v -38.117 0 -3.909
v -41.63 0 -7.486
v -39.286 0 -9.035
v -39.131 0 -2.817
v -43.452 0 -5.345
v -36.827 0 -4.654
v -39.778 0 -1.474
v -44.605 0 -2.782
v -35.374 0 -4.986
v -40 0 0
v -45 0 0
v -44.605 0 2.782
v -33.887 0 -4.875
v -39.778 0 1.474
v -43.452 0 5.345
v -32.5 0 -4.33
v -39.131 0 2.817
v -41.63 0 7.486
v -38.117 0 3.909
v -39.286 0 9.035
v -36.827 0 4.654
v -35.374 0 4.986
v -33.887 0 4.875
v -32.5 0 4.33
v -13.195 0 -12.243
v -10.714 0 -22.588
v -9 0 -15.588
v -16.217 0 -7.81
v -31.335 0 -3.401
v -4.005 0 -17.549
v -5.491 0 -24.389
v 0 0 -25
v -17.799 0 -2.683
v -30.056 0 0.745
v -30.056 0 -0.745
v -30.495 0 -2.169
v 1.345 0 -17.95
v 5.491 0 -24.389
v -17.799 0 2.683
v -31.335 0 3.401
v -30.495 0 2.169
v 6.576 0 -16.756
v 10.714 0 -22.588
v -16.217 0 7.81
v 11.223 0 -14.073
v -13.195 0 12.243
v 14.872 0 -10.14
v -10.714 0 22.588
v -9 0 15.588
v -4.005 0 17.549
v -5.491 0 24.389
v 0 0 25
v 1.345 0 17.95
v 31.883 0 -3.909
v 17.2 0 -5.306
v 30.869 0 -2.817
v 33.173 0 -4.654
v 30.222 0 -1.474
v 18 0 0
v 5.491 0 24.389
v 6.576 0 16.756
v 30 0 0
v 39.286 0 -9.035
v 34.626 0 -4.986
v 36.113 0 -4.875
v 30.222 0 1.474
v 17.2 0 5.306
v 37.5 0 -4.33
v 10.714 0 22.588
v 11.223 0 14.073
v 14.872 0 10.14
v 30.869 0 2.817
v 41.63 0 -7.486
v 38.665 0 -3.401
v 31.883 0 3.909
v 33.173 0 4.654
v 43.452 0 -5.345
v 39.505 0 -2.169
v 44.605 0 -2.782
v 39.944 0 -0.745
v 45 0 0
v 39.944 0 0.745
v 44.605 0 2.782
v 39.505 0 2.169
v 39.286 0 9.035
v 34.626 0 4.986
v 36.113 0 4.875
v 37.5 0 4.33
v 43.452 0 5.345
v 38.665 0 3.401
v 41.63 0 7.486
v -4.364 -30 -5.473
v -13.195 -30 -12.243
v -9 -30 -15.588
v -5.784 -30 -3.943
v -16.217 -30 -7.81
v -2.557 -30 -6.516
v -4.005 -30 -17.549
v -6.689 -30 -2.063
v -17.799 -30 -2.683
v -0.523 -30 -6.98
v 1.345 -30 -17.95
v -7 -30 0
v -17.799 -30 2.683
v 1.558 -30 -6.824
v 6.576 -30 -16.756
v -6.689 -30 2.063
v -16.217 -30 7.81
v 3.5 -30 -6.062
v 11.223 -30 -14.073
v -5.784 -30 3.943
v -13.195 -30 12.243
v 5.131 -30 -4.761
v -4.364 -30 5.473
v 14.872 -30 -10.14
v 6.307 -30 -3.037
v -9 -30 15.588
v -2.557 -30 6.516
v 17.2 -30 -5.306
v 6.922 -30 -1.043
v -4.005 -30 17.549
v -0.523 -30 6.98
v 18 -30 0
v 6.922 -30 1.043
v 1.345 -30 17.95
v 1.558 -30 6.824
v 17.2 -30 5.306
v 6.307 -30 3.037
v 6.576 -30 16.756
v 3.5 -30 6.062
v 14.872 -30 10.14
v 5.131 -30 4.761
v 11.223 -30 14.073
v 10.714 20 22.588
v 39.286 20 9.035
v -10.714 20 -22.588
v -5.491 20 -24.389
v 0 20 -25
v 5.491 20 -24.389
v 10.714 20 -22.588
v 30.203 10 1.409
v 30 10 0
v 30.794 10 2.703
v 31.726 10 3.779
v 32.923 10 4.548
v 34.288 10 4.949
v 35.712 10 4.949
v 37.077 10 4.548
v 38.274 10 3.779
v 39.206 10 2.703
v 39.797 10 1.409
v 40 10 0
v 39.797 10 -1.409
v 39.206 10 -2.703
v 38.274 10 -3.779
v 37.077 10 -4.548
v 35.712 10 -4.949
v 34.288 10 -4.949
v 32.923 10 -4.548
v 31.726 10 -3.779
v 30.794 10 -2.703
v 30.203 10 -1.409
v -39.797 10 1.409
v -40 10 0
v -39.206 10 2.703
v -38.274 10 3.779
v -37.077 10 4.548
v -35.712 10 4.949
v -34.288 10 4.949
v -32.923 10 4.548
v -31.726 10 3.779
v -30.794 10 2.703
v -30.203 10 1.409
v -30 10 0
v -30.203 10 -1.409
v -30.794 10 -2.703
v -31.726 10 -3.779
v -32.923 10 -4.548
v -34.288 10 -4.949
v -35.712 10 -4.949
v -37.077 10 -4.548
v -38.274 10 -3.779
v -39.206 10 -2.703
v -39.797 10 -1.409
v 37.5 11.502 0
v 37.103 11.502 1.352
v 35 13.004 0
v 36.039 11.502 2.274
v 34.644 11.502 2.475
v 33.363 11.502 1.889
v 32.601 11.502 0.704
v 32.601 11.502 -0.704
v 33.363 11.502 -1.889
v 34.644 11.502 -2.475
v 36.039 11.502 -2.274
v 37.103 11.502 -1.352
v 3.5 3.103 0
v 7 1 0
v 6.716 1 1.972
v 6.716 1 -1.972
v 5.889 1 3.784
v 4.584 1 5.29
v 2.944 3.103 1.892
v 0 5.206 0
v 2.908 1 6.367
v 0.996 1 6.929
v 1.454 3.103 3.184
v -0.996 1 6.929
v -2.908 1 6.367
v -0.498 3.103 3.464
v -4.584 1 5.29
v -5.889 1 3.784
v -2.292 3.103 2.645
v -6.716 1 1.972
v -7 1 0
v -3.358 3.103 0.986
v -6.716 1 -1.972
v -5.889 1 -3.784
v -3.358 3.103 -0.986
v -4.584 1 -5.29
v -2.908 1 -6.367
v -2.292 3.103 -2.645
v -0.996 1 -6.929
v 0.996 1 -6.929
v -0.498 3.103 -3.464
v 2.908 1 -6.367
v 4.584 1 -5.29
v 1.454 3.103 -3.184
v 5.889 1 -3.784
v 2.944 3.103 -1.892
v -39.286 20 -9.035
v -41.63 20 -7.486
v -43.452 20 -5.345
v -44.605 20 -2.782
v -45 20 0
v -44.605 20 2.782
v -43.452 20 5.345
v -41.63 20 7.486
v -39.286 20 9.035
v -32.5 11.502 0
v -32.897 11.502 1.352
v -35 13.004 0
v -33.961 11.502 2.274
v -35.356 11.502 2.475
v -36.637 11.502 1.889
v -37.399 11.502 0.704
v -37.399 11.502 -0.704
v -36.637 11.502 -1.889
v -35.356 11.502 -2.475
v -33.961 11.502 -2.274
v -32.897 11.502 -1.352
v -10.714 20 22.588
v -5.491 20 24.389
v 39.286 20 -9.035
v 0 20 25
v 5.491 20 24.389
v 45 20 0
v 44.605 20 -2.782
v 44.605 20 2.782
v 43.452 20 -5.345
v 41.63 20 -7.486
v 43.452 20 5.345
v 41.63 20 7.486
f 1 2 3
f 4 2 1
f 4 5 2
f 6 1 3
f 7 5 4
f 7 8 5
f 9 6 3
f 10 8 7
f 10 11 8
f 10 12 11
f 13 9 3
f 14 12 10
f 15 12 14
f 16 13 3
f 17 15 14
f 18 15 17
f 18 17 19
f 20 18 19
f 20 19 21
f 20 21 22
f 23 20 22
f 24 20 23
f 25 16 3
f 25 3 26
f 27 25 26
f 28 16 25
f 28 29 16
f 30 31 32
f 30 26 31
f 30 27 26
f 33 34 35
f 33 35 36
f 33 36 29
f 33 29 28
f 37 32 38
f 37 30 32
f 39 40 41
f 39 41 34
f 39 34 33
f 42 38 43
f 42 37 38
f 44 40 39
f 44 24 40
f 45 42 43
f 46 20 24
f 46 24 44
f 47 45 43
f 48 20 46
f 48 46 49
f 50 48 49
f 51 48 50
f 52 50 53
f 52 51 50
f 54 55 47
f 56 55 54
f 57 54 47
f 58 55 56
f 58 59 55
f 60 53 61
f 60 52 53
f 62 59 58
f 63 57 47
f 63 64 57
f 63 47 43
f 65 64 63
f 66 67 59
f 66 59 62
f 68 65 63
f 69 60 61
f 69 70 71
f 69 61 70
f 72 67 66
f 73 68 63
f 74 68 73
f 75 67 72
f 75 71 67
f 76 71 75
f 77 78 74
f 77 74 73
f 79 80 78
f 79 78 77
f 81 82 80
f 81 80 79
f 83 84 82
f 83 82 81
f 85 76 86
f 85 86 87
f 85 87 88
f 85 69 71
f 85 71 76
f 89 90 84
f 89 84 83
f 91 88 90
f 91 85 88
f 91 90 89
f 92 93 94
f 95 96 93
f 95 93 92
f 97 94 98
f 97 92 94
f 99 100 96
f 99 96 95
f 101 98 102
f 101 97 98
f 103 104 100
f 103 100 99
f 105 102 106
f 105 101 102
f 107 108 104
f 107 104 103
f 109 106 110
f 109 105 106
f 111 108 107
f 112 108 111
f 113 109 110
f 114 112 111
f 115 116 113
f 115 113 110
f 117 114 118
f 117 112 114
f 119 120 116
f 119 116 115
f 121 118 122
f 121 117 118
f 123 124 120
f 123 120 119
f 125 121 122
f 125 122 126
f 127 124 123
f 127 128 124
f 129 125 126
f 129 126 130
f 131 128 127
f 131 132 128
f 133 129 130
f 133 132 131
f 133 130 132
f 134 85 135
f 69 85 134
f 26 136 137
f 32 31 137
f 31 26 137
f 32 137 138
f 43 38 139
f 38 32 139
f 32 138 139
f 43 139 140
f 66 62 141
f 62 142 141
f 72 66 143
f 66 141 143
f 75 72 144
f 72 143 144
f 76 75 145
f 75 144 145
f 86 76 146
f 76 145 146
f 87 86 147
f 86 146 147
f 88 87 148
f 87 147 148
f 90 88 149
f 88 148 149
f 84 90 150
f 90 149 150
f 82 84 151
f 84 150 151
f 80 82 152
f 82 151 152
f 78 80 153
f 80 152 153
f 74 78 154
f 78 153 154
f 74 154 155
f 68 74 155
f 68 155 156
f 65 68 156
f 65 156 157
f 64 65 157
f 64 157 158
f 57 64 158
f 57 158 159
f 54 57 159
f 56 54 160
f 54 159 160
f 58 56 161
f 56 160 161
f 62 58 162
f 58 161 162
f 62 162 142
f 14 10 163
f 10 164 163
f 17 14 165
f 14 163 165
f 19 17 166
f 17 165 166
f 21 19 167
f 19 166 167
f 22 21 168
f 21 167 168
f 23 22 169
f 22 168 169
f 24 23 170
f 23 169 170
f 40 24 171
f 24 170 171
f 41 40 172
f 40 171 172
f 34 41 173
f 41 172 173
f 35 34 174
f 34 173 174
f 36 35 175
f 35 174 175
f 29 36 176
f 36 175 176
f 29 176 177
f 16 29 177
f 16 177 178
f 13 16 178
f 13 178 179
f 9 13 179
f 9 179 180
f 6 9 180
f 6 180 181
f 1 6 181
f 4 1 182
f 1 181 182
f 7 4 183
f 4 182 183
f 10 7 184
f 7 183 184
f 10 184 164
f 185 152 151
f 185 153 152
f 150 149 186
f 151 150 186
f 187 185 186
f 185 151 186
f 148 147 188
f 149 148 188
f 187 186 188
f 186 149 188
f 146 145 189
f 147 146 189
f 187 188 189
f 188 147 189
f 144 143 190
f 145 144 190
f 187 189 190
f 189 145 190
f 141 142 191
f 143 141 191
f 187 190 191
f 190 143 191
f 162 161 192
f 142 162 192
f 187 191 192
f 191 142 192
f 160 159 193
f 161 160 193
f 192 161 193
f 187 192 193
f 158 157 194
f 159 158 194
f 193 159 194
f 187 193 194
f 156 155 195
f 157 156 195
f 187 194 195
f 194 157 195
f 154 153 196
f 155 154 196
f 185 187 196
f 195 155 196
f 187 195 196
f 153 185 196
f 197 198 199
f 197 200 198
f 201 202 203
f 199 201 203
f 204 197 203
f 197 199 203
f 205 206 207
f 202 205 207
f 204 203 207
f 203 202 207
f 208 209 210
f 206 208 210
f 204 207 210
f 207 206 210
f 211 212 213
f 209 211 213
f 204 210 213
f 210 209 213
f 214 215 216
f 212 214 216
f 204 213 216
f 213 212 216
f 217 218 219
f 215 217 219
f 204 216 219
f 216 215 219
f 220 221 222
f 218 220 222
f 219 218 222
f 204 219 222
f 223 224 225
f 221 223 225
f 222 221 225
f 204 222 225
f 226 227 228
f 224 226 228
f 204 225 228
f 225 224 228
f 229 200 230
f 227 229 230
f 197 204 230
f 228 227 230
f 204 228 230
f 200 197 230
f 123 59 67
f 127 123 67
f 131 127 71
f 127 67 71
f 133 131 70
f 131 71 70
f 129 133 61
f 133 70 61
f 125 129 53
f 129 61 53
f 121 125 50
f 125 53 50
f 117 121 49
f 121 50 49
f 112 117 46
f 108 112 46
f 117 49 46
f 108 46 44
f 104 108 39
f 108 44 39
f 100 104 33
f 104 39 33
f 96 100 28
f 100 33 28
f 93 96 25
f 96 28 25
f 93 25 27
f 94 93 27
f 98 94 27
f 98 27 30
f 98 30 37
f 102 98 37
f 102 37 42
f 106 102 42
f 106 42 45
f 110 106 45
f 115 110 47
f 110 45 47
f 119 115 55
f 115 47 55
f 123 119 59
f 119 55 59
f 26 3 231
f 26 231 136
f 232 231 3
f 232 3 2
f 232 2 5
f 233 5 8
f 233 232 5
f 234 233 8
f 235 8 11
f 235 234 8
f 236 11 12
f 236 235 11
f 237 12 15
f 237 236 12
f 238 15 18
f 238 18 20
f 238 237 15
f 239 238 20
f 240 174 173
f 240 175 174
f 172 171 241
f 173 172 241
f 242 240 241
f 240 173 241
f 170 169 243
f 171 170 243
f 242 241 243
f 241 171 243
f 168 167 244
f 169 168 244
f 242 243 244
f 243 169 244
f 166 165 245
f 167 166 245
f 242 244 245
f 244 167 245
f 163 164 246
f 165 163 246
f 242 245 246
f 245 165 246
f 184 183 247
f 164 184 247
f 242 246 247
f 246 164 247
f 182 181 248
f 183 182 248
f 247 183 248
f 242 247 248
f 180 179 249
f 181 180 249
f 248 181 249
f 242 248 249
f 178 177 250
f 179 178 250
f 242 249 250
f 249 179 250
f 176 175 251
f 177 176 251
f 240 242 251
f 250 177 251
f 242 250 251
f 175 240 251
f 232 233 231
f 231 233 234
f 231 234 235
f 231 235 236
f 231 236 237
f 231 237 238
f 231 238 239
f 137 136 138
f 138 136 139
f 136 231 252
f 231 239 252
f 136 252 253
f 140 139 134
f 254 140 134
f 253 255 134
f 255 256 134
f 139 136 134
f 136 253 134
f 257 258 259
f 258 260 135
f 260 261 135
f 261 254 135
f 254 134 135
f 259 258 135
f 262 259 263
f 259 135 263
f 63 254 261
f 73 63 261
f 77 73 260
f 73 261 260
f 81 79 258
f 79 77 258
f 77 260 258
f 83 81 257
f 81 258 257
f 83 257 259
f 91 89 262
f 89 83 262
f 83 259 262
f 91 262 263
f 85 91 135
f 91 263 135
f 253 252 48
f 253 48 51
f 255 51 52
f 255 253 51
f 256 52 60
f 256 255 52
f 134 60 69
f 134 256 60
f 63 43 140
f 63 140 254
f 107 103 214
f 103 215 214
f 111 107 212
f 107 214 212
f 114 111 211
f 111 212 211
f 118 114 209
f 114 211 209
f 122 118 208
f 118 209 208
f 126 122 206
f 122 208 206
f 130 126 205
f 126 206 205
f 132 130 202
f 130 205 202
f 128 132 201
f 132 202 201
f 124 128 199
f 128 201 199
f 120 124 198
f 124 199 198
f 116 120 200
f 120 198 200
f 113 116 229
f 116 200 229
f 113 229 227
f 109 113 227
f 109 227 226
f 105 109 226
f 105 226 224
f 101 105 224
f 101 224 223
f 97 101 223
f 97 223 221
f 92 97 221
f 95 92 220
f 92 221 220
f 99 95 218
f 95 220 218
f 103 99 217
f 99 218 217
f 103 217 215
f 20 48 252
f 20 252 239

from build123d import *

# Parameters (mm, degrees)
F1_DEPTH    = 20
F2_T1_DEPTH = 125.4092553389
F3_D        = 10
F3_DEPTH    = 10
F3_TIP      = 3.0043030951
F4_R        = 18
F5_DEPTH    = 30
F7_D        = 14
F7_DEPTH    = 31
F7_TIP      = 4.2060243332
F8_T1_DEPTH = 79.2927061282


# Not quite as in the source:
# - a fillet or chamfer that OpenCascade refuses, or shapes differently, is made with other operations: its cross-section is extruded or revolved along the edge and cut away or added


with BuildPart() as f1:
    # F0 (on Front) → F1 (new body)
    with BuildSketch(Plane.XZ):
        with BuildLine():
            ThreePointArc((10.7142859294, -22.5876974706), (21.1288564318, -13.363061995), (25, 0))
            ThreePointArc((25, 0), (21.1288563814, 13.3630620747), (10.7142857589, 22.5876975515))
            ThreePointArc((10.7142857589, 22.5876975515), (1.61e-08, 25), (-10.7142857298, 22.5876975653))
            ThreePointArc((-10.7142857298, 22.5876975653), (-21.1288563728, 13.3630620884), (-25, 0))
            ThreePointArc((-25, 0), (-21.1288561313, -13.3630624702), (-10.7142849134, -22.5876979525))
            ThreePointArc((-10.7142849134, -22.5876979525), (5.623e-07, -25), (10.7142859294, -22.5876974706))
        make_face()
        with BuildLine():
            ThreePointArc((-39.2857140137, -9.0350791581), (-45, -4.32e-08), (-39.2857140918, 9.035079121))
            Line((-39.2857140918, 9.035079121), (-58.3333333333, 0))
            Line((-58.3333333333, 0), (-39.2857140137, -9.0350791581))
        make_face()
        with BuildLine():
            ThreePointArc((-25, 0), (-21.1288563728, 13.3630620884), (-10.7142857298, 22.5876975653))
            Line((-10.7142857298, 22.5876975653), (-39.2857140918, 9.035079121))
            ThreePointArc((-39.2857140918, 9.035079121), (-29.6547750711, 8.4515424899), (-25, 0))
        make_face()
        with BuildLine():
            Line((-39.2857140137, -9.0350791581), (-10.7142849134, -22.5876979525))
            ThreePointArc((-10.7142849134, -22.5876979525), (-21.1288561313, -13.3630624702), (-25, 0))
            ThreePointArc((-25, 0), (-29.6547750345, -8.4515424668), (-39.2857140137, -9.0350791581))
        make_face()
        with BuildLine():
            ThreePointArc((-39.2857140137, -9.0350791581), (-29.6547750345, -8.4515424668), (-25, 0))
            ThreePointArc((-25, 0), (-29.6547750711, 8.4515424899), (-39.2857140918, 9.035079121))
            ThreePointArc((-39.2857140918, 9.035079121), (-45, -4.32e-08), (-39.2857140137, -9.0350791581))
        make_face()
        with BuildLine():
            Line((0, -27.6699295265), (10.7142859294, -22.5876974706))
            ThreePointArc((10.7142859294, -22.5876974706), (5.623e-07, -25), (-10.7142849134, -22.5876979525))
            Line((-10.7142849134, -22.5876979525), (0, -27.6699295265))
        make_face()
        with BuildLine():
            ThreePointArc((-10.7142857298, 22.5876975653), (1.61e-08, 25), (10.7142857589, 22.5876975515))
            Line((10.7142857589, 22.5876975515), (0, 27.6699295265))
            Line((0, 27.6699295265), (-10.7142857298, 22.5876975653))
        make_face()
        with BuildLine():
            Line((58.3333333333, 0), (39.2857143013, 9.0350790217))
            ThreePointArc((39.2857143013, 9.0350790217), (43.4515425519, 5.345224831), (45, 0))
            ThreePointArc((45, 0), (43.4515424899, -5.3452249289), (39.2857140918, -9.035079121))
            Line((39.2857140918, -9.035079121), (58.3333333333, 0))
        make_face()
        with BuildLine():
            ThreePointArc((10.7142857589, 22.5876975515), (21.1288563814, 13.3630620747), (25, 0))
            ThreePointArc((25, 0), (29.654775169, 8.4515425519), (39.2857143013, 9.0350790217))
            Line((39.2857143013, 9.0350790217), (10.7142857589, 22.5876975515))
        make_face()
        with BuildLine():
            ThreePointArc((39.2857140918, -9.035079121), (29.6547750711, -8.4515424899), (25, 0))
            ThreePointArc((25, 0), (21.1288564318, -13.363061995), (10.7142859294, -22.5876974706))
            Line((10.7142859294, -22.5876974706), (39.2857140918, -9.035079121))
        make_face()
        with BuildLine():
            ThreePointArc((39.2857143013, 9.0350790217), (29.654775169, 8.4515425519), (25, 0))
            ThreePointArc((25, 0), (29.6547750711, -8.4515424899), (39.2857140918, -9.035079121))
            ThreePointArc((39.2857140918, -9.035079121), (43.4515424899, -5.3452249289), (45, 0))
            ThreePointArc((45, 0), (43.4515425519, 5.345224831), (39.2857143013, 9.0350790217))
        make_face()
    extrude(amount=-F1_DEPTH)

    # F2: fillet of radius 10 on 2 edges, made by hand

    # F2_s2 → F2_t1 (cut)
    with BuildSketch(Plane.XZ.offset(-72.7046276695)):
        with BuildLine():
            ThreePointArc((-39.2857142857, -9.0350790291), (-45, 0), (-39.2857142857, 9.0350790291))
            Line((-39.2857142857, 9.0350790291), (-58.3333333333, 0))
            Line((-58.3333333333, 0), (-39.2857142857, -9.0350790291))
        make_face()
        with BuildLine():
            ThreePointArc((39.2857142857, -9.0350790291), (45, 0), (39.2857142857, 9.0350790291))
            Line((39.2857142857, 9.0350790291), (58.3333333333, 0))
            Line((58.3333333333, 0), (39.2857142857, -9.0350790291))
        make_face()
    extrude(amount=F2_T1_DEPTH, mode=Mode.SUBTRACT)

    # F3
    with Locations(Plane.XZ):
        with Locations((-35, 0), (35, 0)):
            Hole(F3_D / 2, depth=F3_DEPTH)
            with Locations((0, 0, -(F3_DEPTH + F3_TIP / 2))):  # 118° drill point
                Cone(0, F3_D / 2, F3_TIP, mode=Mode.SUBTRACT)

    # F4 (on face) → F5 (join)
    with BuildSketch(Plane.XZ):
        Circle(F4_R)
    extrude(amount=F5_DEPTH)

    # F7
    with Locations(Plane.XZ.offset(30)):
        with Locations((0, 0)):
            Hole(F7_D / 2, depth=F7_DEPTH)
            with Locations((0, 0, -(F7_DEPTH + F7_TIP / 2))):  # 118° drill point
                Cone(0, F7_D / 2, F7_TIP, mode=Mode.SUBTRACT)

    # F8: fillet of radius 25 on 2 edges, made by hand

    # F8_s2 → F8_t1 (cut)
    with BuildSketch(Plane.XZ.offset(-49.6463530641)):
        with BuildLine():
            ThreePointArc((-10.7142857143, 22.5876975726), (0, 25), (10.7142857143, 22.5876975726))
            Line((10.7142857143, 22.5876975726), (0, 27.6699295265))
            Line((0, 27.6699295265), (-10.7142857143, 22.5876975726))
        make_face()
        with BuildLine():
            ThreePointArc((-10.7142857143, -22.5876975726), (0, -25), (10.7142857143, -22.5876975726))
            Line((10.7142857143, -22.5876975726), (0, -27.6699295265))
            Line((0, -27.6699295265), (-10.7142857143, -22.5876975726))
        make_face()
    extrude(amount=F8_T1_DEPTH, mode=Mode.SUBTRACT)


solid = f1.part
